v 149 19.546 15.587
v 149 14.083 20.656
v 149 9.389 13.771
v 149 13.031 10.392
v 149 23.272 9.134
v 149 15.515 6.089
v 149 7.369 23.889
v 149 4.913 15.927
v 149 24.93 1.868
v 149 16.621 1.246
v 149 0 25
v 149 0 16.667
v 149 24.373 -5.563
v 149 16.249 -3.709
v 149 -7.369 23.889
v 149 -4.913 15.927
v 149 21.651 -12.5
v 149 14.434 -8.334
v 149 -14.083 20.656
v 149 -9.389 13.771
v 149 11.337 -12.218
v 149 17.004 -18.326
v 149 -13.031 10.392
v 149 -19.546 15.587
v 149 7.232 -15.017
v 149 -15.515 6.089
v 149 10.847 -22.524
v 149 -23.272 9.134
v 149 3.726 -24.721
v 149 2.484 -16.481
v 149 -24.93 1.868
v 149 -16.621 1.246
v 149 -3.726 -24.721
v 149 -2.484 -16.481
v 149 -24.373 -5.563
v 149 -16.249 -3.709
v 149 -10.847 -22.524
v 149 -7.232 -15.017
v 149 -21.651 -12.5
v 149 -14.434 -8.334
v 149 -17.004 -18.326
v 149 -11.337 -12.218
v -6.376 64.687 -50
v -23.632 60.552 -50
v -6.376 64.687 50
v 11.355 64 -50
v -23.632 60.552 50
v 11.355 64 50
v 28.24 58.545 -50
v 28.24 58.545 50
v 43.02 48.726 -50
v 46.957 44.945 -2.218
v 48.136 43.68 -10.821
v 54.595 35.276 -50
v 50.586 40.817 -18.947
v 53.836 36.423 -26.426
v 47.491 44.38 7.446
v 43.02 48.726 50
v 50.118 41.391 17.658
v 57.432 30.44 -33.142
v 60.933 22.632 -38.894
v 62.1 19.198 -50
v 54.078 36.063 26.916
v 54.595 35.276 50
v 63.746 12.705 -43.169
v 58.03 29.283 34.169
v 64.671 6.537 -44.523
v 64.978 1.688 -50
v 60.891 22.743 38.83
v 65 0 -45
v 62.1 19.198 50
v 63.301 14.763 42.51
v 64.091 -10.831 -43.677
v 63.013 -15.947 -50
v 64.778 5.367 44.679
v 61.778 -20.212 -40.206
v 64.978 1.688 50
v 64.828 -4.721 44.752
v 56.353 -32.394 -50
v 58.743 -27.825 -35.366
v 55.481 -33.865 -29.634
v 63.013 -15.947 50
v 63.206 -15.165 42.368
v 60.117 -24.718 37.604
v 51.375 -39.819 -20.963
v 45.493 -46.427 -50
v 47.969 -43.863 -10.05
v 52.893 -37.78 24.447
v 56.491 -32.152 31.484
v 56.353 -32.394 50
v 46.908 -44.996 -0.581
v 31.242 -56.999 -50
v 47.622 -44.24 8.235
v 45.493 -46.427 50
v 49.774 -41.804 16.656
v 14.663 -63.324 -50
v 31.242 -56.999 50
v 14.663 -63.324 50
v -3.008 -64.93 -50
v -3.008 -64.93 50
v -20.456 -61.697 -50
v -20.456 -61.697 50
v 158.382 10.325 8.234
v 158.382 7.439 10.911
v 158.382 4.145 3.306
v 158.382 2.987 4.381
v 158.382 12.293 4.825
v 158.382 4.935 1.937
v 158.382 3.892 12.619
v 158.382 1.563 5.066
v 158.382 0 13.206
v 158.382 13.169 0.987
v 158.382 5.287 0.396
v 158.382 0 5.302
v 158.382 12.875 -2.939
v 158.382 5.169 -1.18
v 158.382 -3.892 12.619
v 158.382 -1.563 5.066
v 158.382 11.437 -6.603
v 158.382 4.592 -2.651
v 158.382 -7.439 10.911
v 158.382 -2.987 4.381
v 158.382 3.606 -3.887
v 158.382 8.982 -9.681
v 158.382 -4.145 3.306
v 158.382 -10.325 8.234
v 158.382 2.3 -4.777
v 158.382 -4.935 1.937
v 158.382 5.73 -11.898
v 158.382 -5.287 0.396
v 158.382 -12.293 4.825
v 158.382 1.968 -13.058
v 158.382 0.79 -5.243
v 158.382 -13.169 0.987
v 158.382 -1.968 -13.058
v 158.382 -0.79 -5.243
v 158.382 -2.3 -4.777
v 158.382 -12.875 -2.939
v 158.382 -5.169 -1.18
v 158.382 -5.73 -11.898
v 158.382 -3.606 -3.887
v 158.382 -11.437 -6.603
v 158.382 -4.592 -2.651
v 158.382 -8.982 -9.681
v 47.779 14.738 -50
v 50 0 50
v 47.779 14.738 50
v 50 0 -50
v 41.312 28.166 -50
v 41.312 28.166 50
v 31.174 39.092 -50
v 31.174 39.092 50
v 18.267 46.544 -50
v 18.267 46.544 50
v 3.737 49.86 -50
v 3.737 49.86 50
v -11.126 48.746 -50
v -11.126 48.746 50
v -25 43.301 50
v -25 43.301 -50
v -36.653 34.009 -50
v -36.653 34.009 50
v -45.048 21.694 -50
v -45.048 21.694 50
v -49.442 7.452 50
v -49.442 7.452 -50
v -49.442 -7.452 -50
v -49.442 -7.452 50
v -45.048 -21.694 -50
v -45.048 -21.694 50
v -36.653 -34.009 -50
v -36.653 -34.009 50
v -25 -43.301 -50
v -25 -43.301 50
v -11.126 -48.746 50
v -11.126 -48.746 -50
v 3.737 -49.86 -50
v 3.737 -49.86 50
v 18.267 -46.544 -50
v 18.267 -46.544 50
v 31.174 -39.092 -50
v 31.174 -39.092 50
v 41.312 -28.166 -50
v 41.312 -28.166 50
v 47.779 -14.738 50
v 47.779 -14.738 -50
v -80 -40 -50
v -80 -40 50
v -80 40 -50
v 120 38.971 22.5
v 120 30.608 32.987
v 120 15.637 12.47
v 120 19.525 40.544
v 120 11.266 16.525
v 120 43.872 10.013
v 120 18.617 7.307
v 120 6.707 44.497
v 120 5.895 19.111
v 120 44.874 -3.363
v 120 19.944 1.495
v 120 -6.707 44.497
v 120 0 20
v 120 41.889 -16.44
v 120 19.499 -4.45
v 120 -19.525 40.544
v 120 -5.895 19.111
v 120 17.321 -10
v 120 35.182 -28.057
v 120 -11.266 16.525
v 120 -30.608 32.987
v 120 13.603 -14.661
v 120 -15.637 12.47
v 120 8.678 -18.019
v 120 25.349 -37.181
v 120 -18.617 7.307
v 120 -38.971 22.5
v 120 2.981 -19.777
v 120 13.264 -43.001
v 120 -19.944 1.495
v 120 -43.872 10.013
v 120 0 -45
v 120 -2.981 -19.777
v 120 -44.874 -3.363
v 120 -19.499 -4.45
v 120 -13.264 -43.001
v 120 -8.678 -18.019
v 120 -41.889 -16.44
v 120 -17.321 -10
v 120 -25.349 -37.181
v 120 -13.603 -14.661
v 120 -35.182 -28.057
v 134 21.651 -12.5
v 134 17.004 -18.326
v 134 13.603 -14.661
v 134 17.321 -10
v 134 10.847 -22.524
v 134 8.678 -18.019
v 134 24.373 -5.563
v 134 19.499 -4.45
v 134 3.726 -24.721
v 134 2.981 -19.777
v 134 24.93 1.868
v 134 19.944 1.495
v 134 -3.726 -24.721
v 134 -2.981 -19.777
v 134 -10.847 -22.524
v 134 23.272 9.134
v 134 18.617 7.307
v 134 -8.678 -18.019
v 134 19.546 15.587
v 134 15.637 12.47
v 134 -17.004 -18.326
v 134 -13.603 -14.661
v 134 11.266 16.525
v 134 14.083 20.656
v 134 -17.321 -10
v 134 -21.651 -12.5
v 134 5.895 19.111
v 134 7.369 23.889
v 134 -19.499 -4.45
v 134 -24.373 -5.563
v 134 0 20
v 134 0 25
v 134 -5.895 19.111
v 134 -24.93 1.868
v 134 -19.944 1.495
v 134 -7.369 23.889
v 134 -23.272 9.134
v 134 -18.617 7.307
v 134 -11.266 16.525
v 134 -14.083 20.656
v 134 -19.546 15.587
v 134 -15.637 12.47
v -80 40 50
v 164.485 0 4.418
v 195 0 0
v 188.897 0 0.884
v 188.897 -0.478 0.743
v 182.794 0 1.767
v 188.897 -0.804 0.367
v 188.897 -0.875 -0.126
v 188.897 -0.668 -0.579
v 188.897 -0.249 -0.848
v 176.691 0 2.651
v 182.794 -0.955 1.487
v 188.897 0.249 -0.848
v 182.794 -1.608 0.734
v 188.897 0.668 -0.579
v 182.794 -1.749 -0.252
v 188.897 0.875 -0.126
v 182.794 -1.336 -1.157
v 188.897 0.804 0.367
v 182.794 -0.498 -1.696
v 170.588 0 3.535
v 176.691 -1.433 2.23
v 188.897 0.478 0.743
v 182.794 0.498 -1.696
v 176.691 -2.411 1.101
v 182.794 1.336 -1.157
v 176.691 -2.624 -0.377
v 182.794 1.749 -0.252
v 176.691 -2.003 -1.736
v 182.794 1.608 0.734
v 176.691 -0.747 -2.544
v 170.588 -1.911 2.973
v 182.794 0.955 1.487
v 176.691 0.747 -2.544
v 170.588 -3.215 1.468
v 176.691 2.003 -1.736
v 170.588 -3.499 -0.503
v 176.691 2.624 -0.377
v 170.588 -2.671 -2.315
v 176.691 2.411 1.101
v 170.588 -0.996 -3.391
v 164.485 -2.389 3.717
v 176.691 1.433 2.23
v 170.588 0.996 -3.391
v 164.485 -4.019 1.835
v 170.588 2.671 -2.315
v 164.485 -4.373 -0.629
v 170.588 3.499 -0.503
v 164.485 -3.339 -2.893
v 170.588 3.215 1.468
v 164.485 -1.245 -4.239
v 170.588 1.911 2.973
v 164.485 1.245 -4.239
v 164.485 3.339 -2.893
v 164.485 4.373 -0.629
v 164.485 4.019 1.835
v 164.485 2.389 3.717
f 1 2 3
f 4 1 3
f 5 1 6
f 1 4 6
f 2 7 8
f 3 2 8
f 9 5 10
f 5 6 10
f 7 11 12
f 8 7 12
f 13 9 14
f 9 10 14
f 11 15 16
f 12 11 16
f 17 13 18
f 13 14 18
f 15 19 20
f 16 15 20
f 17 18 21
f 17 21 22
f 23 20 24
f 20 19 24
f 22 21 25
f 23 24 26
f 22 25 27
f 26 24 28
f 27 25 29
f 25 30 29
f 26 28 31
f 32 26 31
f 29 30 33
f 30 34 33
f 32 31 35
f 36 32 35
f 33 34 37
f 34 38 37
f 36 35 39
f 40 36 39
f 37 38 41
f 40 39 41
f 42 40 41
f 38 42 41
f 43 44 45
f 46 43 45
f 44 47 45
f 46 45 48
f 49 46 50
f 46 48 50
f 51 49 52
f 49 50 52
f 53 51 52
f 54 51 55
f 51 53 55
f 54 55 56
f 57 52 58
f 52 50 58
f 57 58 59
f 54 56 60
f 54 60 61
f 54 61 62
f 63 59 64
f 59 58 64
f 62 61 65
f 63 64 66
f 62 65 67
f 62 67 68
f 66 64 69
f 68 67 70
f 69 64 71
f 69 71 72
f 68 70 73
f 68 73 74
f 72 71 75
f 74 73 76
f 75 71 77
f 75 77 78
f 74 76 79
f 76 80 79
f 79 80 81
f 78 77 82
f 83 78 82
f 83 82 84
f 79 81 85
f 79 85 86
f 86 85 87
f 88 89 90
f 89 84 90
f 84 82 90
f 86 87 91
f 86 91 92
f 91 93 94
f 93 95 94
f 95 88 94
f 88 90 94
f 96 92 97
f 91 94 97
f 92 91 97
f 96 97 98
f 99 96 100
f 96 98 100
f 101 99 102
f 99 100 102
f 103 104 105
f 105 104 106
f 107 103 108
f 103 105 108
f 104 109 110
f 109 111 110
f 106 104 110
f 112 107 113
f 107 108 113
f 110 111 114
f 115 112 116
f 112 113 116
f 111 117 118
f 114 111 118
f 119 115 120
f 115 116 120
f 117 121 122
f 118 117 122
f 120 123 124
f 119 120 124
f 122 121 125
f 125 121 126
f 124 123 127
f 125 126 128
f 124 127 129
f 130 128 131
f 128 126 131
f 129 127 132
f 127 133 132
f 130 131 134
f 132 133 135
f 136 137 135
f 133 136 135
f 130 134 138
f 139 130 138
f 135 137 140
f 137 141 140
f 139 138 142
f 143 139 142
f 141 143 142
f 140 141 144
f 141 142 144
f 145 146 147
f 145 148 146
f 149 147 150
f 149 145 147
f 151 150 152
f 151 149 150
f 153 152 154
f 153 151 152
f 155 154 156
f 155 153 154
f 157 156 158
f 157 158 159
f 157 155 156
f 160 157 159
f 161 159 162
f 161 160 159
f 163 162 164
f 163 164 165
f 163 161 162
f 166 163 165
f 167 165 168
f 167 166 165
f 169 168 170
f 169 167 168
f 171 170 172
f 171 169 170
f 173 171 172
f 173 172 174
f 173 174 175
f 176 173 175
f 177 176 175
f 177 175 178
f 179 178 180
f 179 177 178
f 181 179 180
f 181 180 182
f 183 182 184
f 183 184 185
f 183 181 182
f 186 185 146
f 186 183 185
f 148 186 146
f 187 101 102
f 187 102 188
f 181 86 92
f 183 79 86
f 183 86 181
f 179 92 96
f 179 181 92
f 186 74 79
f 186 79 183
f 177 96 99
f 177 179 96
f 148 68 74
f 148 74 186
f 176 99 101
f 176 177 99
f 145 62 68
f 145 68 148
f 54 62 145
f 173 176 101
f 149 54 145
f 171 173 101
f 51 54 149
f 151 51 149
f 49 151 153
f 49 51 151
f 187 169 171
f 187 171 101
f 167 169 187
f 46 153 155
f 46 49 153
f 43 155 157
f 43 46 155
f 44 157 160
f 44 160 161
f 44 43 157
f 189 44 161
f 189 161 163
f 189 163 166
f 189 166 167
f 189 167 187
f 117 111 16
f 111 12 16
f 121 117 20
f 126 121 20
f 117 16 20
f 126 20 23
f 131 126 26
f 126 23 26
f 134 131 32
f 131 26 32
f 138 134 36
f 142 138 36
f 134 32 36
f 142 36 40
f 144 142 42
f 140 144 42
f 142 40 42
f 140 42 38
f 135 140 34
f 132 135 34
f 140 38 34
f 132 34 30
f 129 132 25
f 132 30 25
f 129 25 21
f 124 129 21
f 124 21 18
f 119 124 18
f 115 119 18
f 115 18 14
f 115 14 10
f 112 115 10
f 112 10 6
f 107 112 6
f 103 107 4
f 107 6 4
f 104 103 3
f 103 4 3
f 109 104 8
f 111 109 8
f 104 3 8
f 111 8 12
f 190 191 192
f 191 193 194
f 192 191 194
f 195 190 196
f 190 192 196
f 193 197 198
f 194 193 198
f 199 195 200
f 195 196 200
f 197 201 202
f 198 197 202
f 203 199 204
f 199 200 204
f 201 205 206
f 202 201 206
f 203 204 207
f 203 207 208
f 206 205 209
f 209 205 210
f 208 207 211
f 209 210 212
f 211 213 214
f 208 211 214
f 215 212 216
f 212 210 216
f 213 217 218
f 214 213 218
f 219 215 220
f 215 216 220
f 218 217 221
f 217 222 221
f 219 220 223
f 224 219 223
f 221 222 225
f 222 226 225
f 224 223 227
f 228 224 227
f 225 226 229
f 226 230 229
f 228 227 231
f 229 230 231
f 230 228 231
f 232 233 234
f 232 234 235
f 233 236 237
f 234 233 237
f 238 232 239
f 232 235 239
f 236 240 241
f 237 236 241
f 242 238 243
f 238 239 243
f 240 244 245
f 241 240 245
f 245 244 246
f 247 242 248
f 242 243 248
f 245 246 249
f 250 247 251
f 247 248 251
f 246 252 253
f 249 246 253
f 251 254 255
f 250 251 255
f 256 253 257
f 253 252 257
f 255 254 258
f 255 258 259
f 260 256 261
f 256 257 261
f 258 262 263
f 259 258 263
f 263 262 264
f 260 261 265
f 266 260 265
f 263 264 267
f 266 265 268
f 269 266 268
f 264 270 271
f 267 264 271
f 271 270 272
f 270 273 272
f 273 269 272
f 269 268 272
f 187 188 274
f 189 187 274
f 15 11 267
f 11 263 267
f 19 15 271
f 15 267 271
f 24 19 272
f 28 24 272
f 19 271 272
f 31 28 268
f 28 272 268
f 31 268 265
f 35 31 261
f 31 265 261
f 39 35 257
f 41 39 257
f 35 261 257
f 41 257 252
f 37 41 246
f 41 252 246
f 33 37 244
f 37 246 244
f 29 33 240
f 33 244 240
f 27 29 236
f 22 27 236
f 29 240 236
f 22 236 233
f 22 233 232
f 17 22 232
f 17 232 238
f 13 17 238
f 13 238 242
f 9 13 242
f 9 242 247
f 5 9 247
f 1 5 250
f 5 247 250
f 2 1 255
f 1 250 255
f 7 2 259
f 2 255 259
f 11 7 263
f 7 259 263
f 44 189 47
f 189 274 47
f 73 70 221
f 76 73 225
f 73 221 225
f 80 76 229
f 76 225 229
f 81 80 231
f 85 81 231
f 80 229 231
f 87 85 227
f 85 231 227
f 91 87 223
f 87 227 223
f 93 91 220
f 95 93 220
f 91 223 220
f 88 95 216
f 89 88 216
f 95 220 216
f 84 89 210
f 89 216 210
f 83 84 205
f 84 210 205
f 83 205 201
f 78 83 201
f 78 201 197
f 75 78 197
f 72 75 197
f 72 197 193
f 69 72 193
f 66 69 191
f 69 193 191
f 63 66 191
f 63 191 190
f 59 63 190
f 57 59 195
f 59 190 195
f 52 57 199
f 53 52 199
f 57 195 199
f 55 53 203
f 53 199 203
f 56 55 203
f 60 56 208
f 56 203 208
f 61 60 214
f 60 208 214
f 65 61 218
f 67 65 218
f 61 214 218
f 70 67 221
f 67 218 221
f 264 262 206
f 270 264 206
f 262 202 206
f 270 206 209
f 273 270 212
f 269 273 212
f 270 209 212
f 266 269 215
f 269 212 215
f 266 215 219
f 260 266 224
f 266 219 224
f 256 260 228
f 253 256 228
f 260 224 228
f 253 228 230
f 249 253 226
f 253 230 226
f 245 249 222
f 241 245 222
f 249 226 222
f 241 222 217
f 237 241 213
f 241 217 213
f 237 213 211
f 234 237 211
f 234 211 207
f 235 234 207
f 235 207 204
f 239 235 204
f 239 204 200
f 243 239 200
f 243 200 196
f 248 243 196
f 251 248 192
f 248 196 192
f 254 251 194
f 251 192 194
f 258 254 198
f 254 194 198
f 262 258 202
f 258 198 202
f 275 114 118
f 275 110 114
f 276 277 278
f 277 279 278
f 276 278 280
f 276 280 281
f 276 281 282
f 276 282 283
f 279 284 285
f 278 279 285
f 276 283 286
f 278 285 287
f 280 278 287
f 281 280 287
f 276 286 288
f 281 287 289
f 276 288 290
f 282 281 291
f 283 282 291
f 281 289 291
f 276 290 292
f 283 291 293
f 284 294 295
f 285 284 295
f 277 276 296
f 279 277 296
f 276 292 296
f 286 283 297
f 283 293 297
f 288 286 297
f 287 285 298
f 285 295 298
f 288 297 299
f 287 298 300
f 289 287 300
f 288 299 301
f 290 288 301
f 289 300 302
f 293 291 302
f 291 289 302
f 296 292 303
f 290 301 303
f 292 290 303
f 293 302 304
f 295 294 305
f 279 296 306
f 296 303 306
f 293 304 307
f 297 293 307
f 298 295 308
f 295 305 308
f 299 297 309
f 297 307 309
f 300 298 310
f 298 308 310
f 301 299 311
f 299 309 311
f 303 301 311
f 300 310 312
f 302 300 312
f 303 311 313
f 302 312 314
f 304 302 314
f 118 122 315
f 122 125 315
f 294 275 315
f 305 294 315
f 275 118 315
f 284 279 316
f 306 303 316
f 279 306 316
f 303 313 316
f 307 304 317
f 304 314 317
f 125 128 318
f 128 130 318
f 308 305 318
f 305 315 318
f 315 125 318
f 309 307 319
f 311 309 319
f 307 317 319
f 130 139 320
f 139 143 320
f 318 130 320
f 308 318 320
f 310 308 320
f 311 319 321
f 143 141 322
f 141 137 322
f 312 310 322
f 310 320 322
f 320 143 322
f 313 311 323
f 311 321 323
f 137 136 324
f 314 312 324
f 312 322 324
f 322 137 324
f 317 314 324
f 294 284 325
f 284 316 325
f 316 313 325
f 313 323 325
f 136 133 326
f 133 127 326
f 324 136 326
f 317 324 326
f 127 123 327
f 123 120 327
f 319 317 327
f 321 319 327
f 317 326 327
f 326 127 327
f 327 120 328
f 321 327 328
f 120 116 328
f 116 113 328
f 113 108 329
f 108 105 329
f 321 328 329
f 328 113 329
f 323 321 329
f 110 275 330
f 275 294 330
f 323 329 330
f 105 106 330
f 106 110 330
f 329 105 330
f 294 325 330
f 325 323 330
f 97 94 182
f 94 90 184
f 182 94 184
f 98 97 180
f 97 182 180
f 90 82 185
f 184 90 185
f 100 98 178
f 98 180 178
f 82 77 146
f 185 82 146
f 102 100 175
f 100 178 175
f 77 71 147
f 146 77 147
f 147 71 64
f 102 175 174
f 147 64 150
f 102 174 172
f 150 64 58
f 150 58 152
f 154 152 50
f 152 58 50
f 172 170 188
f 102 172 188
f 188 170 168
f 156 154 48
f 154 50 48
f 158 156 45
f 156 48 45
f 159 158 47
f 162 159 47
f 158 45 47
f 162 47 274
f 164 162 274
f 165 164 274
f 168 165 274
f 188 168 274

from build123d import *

# Parameters (mm, degrees)
SKETCH1_R                = 50
BOSS_EXTRUDE1_DEPTH      = 50
BOSS_EXTRUDE2_REACH      = 218.16
BOSS_EXTRUDE2_END_RADIUS = 65
SKETCH3_R                = 45


with BuildPart() as part:
    # Sketch1 → Boss-Extrude1 (new, symmetric)
    with BuildSketch(Plane.XY):
        with BuildLine():
            Line((-80, -40), (-80, 40))
            Line((-80, 40), (-23.631612274, 60.552018144))
            ThreePointArc((-23.631612274, 60.552018144), (64.978074331, 1.688151706), (-20.45553182, -61.697416623))
            Line((-20.45553182, -61.697416623), (-80, -40))
        make_face()
        Circle(SKETCH1_R, mode=Mode.SUBTRACT)
    extrude(amount=BOSS_EXTRUDE1_DEPTH, both=True)

    # Boss-Extrude2: up to this cylinder (the profile starts outside it)
    boss_extrude2_end = Plane(origin=(0, 0, 0), z_dir=(0, 0, -1)) * Cylinder(BOSS_EXTRUDE2_END_RADIUS, 567.32, mode=Mode.PRIVATE)
    # Sketch3 → Boss-Extrude2 (add, up to the surface)
    with BuildSketch(Plane.ZY.offset(-120), mode=Mode.PRIVATE) as boss_extrude2_sk1:
        with Locations(Location((0, 0, 0), (0, 0, 180))):
            Circle(SKETCH3_R)
    boss_extrude2_tool1 = extrude(boss_extrude2_sk1.sketch, amount=BOSS_EXTRUDE2_REACH, mode=Mode.PRIVATE) - boss_extrude2_end
    add(boss_extrude2_tool1.solids().sort_by_distance((120, 0, 0))[0])

    # Sketch4 → Revolve1 (revolve)
    with BuildSketch(Plane.XY, mode=Mode.PRIVATE) as revolve1_sk:
        Polygon((120, 0), (195, 0), (158.381829475, -5.301847546), (158.381829475, -13.205820305), (149, -16.667218245), (149, -25), (134, -25), (134, -20), (120, -20), align=None)
    revolve(revolve1_sk.sketch.rotate(Axis((120, 0, 0), (1, 0, 0)), 270), axis=Axis((120, 0, 0), (1, 0, 0)))


solid = part.part
